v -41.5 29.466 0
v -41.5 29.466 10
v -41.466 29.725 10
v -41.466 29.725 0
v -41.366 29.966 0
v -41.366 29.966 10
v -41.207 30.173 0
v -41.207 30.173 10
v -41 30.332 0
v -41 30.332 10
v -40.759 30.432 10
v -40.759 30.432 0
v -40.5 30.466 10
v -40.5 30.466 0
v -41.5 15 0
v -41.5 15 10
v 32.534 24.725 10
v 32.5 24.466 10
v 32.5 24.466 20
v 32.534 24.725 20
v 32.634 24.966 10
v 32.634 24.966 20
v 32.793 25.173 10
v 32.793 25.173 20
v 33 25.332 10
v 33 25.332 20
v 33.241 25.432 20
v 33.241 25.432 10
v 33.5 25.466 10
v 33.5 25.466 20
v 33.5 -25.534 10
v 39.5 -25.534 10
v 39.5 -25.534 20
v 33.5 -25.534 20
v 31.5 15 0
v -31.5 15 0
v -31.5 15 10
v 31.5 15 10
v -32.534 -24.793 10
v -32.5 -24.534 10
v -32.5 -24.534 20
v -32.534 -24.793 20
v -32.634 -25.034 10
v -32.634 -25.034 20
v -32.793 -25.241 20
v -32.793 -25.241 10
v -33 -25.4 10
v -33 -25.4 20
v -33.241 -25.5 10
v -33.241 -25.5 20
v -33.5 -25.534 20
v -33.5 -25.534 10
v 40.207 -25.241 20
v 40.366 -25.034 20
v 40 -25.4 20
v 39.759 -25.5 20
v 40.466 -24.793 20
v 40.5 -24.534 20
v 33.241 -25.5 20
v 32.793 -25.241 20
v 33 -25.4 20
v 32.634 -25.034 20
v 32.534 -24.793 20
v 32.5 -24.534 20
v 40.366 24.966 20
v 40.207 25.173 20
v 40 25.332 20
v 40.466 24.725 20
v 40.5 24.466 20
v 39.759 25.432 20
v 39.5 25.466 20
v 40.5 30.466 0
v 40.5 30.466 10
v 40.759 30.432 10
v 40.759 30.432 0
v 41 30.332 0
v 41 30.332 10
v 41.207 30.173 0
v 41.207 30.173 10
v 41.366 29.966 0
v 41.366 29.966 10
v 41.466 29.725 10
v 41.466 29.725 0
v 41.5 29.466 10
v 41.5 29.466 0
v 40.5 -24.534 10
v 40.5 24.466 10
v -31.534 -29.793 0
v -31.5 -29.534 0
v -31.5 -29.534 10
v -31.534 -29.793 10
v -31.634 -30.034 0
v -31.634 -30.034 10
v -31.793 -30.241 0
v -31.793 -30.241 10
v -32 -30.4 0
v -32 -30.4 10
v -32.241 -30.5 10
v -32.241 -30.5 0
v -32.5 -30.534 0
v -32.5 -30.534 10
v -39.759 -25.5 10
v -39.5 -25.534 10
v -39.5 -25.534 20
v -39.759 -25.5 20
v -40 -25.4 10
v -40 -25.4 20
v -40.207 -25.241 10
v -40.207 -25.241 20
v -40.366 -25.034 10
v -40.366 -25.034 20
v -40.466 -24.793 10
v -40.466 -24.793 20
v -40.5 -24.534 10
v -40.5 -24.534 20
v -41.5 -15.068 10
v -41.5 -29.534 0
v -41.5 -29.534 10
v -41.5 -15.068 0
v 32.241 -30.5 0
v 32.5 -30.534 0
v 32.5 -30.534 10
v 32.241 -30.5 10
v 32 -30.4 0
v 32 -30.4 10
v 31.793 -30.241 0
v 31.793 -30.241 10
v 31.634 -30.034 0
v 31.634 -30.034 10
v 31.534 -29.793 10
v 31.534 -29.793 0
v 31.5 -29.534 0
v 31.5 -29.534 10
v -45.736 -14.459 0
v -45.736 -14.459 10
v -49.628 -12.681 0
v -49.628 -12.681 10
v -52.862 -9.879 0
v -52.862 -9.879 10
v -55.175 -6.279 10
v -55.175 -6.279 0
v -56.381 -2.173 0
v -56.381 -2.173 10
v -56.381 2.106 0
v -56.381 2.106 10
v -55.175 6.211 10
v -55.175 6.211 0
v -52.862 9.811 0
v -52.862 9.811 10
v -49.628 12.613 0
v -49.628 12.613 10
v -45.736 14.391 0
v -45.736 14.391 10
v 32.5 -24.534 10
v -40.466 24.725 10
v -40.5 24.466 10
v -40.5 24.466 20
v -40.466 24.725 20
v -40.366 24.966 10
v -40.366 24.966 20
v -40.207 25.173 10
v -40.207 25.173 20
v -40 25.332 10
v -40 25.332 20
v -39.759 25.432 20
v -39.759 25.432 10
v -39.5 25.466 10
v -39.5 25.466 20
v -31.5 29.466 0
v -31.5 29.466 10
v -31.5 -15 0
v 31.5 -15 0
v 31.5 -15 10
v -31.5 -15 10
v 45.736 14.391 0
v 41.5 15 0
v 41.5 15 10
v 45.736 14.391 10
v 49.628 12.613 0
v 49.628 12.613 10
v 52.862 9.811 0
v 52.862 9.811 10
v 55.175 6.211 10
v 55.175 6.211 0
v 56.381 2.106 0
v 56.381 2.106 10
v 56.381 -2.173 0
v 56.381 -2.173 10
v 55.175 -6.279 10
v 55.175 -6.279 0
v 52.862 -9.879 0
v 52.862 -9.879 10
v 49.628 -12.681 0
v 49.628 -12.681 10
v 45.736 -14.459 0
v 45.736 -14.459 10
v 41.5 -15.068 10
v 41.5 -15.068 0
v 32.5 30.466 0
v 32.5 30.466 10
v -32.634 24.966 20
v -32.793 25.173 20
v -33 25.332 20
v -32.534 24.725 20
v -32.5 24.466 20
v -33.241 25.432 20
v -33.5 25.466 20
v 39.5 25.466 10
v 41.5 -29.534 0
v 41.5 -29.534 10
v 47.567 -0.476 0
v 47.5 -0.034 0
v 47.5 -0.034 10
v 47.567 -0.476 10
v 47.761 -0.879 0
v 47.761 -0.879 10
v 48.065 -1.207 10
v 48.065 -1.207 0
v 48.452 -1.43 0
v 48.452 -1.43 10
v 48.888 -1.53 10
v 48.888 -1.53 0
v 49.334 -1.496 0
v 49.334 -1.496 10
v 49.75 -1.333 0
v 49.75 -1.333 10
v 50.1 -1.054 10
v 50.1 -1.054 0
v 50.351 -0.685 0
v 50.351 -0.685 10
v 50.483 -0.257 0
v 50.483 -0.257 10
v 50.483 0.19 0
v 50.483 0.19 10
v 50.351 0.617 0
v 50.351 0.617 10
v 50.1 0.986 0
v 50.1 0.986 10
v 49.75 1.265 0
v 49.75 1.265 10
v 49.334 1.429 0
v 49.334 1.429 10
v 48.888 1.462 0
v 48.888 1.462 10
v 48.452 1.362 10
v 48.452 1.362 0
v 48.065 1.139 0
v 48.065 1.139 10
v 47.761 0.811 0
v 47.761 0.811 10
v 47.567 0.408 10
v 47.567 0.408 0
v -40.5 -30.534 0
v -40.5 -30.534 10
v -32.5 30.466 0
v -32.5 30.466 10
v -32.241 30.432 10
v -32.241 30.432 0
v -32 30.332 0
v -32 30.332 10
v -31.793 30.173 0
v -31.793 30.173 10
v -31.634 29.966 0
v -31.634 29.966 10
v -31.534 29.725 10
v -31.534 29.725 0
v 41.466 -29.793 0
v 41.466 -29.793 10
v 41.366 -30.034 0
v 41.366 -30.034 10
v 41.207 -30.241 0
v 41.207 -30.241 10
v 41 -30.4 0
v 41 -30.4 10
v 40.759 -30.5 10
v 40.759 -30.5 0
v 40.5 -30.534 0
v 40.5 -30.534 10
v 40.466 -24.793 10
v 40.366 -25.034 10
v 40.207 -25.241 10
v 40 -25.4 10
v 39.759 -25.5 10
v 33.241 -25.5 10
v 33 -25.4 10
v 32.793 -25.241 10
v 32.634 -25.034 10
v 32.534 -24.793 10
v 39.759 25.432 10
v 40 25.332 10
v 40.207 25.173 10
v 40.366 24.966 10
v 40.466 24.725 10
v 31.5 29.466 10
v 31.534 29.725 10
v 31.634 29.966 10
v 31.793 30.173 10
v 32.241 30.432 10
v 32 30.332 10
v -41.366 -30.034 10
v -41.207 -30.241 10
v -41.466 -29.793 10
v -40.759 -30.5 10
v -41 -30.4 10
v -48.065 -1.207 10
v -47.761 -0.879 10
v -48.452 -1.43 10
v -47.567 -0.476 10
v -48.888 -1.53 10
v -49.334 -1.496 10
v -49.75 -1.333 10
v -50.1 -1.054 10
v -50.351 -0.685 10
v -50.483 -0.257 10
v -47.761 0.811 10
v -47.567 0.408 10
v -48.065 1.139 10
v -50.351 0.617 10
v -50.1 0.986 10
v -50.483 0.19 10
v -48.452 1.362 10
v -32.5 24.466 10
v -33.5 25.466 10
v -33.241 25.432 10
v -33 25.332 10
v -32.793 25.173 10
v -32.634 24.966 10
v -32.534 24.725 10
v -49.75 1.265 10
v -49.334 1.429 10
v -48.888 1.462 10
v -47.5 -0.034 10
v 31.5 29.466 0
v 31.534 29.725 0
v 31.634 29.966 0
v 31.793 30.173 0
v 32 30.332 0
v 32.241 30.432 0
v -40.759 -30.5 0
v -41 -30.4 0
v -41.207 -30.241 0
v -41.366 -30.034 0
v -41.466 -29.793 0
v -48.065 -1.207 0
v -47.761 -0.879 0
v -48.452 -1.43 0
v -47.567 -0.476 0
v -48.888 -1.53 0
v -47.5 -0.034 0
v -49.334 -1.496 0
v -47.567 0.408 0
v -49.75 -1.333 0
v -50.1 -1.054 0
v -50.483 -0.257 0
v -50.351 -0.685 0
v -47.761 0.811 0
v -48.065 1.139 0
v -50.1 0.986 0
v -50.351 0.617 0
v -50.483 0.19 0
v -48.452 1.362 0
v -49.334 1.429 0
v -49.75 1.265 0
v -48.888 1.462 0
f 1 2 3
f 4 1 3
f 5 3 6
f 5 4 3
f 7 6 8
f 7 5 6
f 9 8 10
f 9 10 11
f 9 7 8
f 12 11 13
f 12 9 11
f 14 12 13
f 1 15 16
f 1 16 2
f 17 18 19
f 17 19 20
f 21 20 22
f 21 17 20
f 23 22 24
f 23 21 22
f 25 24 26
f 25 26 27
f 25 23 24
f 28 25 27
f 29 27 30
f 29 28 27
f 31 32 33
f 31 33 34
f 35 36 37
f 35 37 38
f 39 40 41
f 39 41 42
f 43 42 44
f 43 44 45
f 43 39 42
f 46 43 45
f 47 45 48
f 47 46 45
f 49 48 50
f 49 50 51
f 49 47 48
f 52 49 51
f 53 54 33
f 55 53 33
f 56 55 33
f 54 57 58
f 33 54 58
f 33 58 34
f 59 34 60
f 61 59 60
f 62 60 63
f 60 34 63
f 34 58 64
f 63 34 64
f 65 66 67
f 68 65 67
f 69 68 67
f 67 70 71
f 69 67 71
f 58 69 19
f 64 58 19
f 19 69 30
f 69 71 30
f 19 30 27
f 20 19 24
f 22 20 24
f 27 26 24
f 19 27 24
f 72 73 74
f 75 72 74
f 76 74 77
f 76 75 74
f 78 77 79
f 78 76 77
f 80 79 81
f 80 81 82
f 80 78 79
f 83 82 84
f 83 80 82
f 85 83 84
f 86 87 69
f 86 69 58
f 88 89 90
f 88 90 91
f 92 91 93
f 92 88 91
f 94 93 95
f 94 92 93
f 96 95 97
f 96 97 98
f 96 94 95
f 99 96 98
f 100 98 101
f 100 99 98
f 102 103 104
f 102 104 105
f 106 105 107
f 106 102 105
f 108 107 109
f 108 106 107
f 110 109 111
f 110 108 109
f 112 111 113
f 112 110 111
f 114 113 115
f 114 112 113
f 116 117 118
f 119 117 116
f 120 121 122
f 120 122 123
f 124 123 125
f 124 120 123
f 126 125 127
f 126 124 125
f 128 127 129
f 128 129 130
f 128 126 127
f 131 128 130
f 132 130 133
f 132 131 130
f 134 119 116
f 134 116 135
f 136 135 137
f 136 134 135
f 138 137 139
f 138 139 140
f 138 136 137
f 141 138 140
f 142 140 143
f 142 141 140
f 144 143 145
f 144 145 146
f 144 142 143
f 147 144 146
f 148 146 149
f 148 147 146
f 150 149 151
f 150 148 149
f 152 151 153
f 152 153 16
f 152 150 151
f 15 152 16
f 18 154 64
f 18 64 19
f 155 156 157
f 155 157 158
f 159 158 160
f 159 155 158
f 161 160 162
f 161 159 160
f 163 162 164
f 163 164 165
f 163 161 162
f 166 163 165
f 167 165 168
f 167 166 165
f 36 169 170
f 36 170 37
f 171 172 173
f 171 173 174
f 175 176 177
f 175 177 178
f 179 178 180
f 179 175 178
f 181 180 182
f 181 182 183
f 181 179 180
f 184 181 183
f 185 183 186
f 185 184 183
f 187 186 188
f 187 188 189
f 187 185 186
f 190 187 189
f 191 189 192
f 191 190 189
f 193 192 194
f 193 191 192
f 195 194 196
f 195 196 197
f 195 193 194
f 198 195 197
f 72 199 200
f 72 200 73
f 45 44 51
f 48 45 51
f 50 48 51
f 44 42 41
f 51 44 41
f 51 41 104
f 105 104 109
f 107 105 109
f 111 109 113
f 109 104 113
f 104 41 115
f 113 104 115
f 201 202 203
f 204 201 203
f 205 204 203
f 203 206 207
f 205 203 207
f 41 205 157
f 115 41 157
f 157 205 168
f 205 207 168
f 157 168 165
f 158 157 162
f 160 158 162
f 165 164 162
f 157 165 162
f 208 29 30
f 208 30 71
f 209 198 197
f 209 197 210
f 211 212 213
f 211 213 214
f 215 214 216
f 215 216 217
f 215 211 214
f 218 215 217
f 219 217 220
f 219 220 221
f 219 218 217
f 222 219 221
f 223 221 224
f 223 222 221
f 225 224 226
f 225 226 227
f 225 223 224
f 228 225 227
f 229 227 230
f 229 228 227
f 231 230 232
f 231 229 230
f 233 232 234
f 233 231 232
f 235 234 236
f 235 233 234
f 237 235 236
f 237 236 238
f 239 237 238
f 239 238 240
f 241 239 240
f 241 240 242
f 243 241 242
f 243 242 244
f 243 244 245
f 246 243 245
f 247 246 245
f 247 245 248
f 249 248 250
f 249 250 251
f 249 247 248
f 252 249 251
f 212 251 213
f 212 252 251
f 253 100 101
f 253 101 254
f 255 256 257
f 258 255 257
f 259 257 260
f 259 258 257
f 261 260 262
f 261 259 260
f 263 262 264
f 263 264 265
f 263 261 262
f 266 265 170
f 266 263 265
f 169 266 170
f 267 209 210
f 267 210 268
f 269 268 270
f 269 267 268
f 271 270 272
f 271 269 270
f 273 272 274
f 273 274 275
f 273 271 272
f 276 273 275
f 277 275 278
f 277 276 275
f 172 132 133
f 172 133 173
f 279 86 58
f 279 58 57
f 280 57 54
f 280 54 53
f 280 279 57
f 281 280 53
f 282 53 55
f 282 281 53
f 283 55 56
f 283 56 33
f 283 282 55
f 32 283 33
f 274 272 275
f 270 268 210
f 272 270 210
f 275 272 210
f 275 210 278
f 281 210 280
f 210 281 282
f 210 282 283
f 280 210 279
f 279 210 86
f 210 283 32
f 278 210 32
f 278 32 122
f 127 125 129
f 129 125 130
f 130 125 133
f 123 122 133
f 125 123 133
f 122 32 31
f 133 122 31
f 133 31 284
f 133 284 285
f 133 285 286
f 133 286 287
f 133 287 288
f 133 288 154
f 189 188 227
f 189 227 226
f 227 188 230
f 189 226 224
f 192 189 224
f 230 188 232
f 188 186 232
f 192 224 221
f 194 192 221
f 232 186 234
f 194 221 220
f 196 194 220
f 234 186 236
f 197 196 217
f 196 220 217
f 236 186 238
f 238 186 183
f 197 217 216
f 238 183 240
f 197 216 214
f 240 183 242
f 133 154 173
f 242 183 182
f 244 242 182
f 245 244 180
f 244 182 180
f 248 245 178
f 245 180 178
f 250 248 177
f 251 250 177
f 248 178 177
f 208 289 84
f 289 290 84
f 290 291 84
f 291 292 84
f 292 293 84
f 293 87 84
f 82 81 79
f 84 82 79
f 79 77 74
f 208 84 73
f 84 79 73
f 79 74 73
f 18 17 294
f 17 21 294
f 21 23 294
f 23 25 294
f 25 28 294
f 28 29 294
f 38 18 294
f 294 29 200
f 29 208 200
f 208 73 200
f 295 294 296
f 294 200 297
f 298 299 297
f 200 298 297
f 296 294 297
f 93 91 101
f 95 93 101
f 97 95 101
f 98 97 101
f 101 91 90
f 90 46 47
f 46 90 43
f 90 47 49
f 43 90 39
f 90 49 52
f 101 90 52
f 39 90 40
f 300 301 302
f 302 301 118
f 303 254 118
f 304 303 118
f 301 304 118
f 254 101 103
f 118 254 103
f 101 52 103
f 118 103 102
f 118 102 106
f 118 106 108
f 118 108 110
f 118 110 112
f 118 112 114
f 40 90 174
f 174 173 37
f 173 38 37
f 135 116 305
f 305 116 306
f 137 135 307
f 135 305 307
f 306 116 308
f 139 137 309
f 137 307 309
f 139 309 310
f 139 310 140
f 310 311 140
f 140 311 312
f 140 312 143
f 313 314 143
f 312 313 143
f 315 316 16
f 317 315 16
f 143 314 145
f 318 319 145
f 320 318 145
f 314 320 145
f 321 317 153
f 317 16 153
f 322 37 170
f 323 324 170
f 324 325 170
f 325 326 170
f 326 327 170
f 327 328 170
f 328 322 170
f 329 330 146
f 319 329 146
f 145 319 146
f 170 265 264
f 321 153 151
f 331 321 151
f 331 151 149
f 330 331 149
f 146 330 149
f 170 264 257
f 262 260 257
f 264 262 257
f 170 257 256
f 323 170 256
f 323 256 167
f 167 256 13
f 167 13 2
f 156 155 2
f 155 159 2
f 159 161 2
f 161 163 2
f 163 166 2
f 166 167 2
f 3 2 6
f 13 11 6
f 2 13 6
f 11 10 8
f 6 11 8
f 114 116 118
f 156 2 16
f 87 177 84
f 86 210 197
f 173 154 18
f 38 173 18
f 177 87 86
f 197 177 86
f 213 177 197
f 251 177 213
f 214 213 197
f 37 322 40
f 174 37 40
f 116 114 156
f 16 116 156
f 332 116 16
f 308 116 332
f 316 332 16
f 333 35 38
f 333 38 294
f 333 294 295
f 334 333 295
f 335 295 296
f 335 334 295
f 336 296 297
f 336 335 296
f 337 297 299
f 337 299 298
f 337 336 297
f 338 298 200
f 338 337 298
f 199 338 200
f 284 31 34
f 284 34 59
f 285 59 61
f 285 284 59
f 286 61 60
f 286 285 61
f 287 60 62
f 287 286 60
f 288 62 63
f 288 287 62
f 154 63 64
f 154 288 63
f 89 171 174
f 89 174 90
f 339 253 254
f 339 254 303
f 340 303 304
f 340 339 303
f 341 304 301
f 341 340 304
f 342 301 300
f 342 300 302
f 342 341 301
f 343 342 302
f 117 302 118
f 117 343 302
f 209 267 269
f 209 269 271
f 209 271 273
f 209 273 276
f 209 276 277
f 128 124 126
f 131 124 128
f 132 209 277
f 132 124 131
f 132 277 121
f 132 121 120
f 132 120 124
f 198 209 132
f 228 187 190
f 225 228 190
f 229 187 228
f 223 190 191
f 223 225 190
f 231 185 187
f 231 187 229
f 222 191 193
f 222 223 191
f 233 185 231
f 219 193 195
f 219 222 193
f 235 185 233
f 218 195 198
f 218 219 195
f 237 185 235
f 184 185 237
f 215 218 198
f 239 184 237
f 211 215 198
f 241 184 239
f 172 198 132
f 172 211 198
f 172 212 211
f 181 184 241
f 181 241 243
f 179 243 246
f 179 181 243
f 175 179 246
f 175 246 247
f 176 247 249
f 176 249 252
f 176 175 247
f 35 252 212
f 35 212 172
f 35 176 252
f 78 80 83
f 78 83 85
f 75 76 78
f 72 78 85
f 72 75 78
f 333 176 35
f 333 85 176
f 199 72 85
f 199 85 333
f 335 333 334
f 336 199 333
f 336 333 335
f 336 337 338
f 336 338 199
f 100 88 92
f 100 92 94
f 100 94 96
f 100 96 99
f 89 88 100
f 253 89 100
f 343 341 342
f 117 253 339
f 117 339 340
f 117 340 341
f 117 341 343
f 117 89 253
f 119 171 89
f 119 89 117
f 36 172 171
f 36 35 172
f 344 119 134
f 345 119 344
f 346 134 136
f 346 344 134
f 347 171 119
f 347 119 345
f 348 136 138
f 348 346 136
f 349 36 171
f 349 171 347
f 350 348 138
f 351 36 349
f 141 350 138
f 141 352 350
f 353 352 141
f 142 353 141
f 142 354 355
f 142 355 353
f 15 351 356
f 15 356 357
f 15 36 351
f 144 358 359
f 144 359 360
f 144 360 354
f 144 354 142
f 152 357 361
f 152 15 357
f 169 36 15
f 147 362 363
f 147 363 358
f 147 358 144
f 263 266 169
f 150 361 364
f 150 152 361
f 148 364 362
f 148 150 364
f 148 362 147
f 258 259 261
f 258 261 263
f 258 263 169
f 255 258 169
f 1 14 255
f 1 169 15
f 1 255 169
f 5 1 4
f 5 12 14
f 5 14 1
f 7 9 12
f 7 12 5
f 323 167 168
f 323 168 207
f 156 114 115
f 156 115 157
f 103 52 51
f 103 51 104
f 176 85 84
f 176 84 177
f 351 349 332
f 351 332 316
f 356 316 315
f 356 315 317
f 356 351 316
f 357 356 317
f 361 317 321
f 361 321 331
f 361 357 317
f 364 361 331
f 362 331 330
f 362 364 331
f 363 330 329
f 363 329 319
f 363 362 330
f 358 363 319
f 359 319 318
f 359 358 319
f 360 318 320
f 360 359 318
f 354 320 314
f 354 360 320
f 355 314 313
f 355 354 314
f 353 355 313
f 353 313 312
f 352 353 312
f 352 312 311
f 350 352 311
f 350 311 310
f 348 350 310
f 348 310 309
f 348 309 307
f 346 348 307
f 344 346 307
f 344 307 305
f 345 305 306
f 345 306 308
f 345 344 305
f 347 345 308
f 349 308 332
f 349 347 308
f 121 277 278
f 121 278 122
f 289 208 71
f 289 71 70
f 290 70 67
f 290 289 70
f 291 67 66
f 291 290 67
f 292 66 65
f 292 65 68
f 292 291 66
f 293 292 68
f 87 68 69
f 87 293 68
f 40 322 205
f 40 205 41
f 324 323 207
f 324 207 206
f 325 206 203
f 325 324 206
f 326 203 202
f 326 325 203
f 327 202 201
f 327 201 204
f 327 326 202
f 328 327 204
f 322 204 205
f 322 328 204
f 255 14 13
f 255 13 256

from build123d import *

# Parameters (mm, degrees)
SKETCH1_R           = 1.5
BOSS_EXTRUDE1_DEPTH = 10
BOSS_EXTRUDE2_DEPTH = 10


with BuildPart() as part:
    # Sketch1 → Boss-Extrude1 (new body)
    with BuildSketch(Plane.XY):
        with BuildLine():
            Line((31.5, -15), (-31.5, -15))
            Line((-31.5, -15), (-31.5, -29.533829211))
            ThreePointArc((-31.5, -29.533829211), (-31.792893219, -30.240935993), (-32.5, -30.533829211))
            Line((-32.5, -30.533829211), (-40.5, -30.533829211))
            ThreePointArc((-40.5, -30.533829211), (-41.207106781, -30.240935993), (-41.5, -29.533829211))
            Line((-41.5, -29.533829211), (-41.5, -15.067658423))
            ThreePointArc((-41.5, -15.067658423), (-56.533829211, -0.033829211), (-41.5, 15))
            Line((-41.5, 15), (-41.5, 29.466170789))
            ThreePointArc((-41.5, 29.466170789), (-41.207106781, 30.17327757), (-40.5, 30.466170789))
            Line((-40.5, 30.466170789), (-32.5, 30.466170789))
            ThreePointArc((-32.5, 30.466170789), (-31.792893219, 30.17327757), (-31.5, 29.466170789))
            Line((-31.5, 29.466170789), (-31.5, 15))
            Line((-31.5, 15), (31.5, 15))
            Line((31.5, 15), (31.5, 29.466170789))
            ThreePointArc((31.5, 29.466170789), (31.792893219, 30.17327757), (32.5, 30.466170789))
            Line((32.5, 30.466170789), (40.5, 30.466170789))
            ThreePointArc((40.5, 30.466170789), (41.207106781, 30.17327757), (41.5, 29.466170789))
            Line((41.5, 29.466170789), (41.5, 15))
            ThreePointArc((41.5, 15), (56.533829211, -0.033829211), (41.5, -15.067658423))
            Line((41.5, -15.067658423), (41.5, -29.533829211))
            ThreePointArc((41.5, -29.533829211), (41.207106781, -30.240935993), (40.5, -30.533829211))
            Line((40.5, -30.533829211), (32.5, -30.533829211))
            ThreePointArc((32.5, -30.533829211), (31.792893219, -30.240935993), (31.5, -29.533829211))
            Line((31.5, -29.533829211), (31.5, -15))
        make_face()
        with Locations((-49, -0.033829211)):
            Circle(SKETCH1_R, mode=Mode.SUBTRACT)
        with Locations(Location((49, -0.033829211, 0), (0, 0, 180))):
            Circle(SKETCH1_R, mode=Mode.SUBTRACT)
    extrude(amount=BOSS_EXTRUDE1_DEPTH)

    # Sketch2 → Boss-Extrude2 (add)
    with BuildSketch(Plane.XY.offset(10)):
        with BuildLine():
            Line((-33.499984323, -25.533829211), (-39.499984323, -25.533829211))
            ThreePointArc((-39.499984323, -25.533829211), (-40.207091104, -25.240935993), (-40.499984323, -24.533829211))
            Line((-40.499984323, -24.533829211), (-40.499984323, 24.466170789))
            ThreePointArc((-40.499984323, 24.466170789), (-40.207091104, 25.17327757), (-39.499984323, 25.466170789))
            Line((-39.499984323, 25.466170789), (-33.499984323, 25.466170789))
            ThreePointArc((-33.499984323, 25.466170789), (-32.792877542, 25.17327757), (-32.499984323, 24.466170789))
            Line((-32.499984323, 24.466170789), (-32.499984323, -24.533829211))
            ThreePointArc((-32.499984323, -24.533829211), (-32.792877542, -25.240935993), (-33.499984323, -25.533829211))
        make_face()
        with BuildLine():
            Line((33.499984323, 25.466170789), (39.499984323, 25.466170789))
            ThreePointArc((39.499984323, 25.466170789), (40.207091104, 25.17327757), (40.499984323, 24.466170789))
            Line((40.499984323, 24.466170789), (40.499984323, -24.533829211))
            ThreePointArc((40.499984323, -24.533829211), (40.207091104, -25.240935993), (39.499984323, -25.533829211))
            Line((39.499984323, -25.533829211), (33.499984323, -25.533829211))
            ThreePointArc((33.499984323, -25.533829211), (32.792877542, -25.240935993), (32.499984323, -24.533829211))
            Line((32.499984323, -24.533829211), (32.499984323, 24.466170789))
            ThreePointArc((32.499984323, 24.466170789), (32.792877542, 25.17327757), (33.499984323, 25.466170789))
        make_face()
    extrude(amount=BOSS_EXTRUDE2_DEPTH)


solid = part.part
